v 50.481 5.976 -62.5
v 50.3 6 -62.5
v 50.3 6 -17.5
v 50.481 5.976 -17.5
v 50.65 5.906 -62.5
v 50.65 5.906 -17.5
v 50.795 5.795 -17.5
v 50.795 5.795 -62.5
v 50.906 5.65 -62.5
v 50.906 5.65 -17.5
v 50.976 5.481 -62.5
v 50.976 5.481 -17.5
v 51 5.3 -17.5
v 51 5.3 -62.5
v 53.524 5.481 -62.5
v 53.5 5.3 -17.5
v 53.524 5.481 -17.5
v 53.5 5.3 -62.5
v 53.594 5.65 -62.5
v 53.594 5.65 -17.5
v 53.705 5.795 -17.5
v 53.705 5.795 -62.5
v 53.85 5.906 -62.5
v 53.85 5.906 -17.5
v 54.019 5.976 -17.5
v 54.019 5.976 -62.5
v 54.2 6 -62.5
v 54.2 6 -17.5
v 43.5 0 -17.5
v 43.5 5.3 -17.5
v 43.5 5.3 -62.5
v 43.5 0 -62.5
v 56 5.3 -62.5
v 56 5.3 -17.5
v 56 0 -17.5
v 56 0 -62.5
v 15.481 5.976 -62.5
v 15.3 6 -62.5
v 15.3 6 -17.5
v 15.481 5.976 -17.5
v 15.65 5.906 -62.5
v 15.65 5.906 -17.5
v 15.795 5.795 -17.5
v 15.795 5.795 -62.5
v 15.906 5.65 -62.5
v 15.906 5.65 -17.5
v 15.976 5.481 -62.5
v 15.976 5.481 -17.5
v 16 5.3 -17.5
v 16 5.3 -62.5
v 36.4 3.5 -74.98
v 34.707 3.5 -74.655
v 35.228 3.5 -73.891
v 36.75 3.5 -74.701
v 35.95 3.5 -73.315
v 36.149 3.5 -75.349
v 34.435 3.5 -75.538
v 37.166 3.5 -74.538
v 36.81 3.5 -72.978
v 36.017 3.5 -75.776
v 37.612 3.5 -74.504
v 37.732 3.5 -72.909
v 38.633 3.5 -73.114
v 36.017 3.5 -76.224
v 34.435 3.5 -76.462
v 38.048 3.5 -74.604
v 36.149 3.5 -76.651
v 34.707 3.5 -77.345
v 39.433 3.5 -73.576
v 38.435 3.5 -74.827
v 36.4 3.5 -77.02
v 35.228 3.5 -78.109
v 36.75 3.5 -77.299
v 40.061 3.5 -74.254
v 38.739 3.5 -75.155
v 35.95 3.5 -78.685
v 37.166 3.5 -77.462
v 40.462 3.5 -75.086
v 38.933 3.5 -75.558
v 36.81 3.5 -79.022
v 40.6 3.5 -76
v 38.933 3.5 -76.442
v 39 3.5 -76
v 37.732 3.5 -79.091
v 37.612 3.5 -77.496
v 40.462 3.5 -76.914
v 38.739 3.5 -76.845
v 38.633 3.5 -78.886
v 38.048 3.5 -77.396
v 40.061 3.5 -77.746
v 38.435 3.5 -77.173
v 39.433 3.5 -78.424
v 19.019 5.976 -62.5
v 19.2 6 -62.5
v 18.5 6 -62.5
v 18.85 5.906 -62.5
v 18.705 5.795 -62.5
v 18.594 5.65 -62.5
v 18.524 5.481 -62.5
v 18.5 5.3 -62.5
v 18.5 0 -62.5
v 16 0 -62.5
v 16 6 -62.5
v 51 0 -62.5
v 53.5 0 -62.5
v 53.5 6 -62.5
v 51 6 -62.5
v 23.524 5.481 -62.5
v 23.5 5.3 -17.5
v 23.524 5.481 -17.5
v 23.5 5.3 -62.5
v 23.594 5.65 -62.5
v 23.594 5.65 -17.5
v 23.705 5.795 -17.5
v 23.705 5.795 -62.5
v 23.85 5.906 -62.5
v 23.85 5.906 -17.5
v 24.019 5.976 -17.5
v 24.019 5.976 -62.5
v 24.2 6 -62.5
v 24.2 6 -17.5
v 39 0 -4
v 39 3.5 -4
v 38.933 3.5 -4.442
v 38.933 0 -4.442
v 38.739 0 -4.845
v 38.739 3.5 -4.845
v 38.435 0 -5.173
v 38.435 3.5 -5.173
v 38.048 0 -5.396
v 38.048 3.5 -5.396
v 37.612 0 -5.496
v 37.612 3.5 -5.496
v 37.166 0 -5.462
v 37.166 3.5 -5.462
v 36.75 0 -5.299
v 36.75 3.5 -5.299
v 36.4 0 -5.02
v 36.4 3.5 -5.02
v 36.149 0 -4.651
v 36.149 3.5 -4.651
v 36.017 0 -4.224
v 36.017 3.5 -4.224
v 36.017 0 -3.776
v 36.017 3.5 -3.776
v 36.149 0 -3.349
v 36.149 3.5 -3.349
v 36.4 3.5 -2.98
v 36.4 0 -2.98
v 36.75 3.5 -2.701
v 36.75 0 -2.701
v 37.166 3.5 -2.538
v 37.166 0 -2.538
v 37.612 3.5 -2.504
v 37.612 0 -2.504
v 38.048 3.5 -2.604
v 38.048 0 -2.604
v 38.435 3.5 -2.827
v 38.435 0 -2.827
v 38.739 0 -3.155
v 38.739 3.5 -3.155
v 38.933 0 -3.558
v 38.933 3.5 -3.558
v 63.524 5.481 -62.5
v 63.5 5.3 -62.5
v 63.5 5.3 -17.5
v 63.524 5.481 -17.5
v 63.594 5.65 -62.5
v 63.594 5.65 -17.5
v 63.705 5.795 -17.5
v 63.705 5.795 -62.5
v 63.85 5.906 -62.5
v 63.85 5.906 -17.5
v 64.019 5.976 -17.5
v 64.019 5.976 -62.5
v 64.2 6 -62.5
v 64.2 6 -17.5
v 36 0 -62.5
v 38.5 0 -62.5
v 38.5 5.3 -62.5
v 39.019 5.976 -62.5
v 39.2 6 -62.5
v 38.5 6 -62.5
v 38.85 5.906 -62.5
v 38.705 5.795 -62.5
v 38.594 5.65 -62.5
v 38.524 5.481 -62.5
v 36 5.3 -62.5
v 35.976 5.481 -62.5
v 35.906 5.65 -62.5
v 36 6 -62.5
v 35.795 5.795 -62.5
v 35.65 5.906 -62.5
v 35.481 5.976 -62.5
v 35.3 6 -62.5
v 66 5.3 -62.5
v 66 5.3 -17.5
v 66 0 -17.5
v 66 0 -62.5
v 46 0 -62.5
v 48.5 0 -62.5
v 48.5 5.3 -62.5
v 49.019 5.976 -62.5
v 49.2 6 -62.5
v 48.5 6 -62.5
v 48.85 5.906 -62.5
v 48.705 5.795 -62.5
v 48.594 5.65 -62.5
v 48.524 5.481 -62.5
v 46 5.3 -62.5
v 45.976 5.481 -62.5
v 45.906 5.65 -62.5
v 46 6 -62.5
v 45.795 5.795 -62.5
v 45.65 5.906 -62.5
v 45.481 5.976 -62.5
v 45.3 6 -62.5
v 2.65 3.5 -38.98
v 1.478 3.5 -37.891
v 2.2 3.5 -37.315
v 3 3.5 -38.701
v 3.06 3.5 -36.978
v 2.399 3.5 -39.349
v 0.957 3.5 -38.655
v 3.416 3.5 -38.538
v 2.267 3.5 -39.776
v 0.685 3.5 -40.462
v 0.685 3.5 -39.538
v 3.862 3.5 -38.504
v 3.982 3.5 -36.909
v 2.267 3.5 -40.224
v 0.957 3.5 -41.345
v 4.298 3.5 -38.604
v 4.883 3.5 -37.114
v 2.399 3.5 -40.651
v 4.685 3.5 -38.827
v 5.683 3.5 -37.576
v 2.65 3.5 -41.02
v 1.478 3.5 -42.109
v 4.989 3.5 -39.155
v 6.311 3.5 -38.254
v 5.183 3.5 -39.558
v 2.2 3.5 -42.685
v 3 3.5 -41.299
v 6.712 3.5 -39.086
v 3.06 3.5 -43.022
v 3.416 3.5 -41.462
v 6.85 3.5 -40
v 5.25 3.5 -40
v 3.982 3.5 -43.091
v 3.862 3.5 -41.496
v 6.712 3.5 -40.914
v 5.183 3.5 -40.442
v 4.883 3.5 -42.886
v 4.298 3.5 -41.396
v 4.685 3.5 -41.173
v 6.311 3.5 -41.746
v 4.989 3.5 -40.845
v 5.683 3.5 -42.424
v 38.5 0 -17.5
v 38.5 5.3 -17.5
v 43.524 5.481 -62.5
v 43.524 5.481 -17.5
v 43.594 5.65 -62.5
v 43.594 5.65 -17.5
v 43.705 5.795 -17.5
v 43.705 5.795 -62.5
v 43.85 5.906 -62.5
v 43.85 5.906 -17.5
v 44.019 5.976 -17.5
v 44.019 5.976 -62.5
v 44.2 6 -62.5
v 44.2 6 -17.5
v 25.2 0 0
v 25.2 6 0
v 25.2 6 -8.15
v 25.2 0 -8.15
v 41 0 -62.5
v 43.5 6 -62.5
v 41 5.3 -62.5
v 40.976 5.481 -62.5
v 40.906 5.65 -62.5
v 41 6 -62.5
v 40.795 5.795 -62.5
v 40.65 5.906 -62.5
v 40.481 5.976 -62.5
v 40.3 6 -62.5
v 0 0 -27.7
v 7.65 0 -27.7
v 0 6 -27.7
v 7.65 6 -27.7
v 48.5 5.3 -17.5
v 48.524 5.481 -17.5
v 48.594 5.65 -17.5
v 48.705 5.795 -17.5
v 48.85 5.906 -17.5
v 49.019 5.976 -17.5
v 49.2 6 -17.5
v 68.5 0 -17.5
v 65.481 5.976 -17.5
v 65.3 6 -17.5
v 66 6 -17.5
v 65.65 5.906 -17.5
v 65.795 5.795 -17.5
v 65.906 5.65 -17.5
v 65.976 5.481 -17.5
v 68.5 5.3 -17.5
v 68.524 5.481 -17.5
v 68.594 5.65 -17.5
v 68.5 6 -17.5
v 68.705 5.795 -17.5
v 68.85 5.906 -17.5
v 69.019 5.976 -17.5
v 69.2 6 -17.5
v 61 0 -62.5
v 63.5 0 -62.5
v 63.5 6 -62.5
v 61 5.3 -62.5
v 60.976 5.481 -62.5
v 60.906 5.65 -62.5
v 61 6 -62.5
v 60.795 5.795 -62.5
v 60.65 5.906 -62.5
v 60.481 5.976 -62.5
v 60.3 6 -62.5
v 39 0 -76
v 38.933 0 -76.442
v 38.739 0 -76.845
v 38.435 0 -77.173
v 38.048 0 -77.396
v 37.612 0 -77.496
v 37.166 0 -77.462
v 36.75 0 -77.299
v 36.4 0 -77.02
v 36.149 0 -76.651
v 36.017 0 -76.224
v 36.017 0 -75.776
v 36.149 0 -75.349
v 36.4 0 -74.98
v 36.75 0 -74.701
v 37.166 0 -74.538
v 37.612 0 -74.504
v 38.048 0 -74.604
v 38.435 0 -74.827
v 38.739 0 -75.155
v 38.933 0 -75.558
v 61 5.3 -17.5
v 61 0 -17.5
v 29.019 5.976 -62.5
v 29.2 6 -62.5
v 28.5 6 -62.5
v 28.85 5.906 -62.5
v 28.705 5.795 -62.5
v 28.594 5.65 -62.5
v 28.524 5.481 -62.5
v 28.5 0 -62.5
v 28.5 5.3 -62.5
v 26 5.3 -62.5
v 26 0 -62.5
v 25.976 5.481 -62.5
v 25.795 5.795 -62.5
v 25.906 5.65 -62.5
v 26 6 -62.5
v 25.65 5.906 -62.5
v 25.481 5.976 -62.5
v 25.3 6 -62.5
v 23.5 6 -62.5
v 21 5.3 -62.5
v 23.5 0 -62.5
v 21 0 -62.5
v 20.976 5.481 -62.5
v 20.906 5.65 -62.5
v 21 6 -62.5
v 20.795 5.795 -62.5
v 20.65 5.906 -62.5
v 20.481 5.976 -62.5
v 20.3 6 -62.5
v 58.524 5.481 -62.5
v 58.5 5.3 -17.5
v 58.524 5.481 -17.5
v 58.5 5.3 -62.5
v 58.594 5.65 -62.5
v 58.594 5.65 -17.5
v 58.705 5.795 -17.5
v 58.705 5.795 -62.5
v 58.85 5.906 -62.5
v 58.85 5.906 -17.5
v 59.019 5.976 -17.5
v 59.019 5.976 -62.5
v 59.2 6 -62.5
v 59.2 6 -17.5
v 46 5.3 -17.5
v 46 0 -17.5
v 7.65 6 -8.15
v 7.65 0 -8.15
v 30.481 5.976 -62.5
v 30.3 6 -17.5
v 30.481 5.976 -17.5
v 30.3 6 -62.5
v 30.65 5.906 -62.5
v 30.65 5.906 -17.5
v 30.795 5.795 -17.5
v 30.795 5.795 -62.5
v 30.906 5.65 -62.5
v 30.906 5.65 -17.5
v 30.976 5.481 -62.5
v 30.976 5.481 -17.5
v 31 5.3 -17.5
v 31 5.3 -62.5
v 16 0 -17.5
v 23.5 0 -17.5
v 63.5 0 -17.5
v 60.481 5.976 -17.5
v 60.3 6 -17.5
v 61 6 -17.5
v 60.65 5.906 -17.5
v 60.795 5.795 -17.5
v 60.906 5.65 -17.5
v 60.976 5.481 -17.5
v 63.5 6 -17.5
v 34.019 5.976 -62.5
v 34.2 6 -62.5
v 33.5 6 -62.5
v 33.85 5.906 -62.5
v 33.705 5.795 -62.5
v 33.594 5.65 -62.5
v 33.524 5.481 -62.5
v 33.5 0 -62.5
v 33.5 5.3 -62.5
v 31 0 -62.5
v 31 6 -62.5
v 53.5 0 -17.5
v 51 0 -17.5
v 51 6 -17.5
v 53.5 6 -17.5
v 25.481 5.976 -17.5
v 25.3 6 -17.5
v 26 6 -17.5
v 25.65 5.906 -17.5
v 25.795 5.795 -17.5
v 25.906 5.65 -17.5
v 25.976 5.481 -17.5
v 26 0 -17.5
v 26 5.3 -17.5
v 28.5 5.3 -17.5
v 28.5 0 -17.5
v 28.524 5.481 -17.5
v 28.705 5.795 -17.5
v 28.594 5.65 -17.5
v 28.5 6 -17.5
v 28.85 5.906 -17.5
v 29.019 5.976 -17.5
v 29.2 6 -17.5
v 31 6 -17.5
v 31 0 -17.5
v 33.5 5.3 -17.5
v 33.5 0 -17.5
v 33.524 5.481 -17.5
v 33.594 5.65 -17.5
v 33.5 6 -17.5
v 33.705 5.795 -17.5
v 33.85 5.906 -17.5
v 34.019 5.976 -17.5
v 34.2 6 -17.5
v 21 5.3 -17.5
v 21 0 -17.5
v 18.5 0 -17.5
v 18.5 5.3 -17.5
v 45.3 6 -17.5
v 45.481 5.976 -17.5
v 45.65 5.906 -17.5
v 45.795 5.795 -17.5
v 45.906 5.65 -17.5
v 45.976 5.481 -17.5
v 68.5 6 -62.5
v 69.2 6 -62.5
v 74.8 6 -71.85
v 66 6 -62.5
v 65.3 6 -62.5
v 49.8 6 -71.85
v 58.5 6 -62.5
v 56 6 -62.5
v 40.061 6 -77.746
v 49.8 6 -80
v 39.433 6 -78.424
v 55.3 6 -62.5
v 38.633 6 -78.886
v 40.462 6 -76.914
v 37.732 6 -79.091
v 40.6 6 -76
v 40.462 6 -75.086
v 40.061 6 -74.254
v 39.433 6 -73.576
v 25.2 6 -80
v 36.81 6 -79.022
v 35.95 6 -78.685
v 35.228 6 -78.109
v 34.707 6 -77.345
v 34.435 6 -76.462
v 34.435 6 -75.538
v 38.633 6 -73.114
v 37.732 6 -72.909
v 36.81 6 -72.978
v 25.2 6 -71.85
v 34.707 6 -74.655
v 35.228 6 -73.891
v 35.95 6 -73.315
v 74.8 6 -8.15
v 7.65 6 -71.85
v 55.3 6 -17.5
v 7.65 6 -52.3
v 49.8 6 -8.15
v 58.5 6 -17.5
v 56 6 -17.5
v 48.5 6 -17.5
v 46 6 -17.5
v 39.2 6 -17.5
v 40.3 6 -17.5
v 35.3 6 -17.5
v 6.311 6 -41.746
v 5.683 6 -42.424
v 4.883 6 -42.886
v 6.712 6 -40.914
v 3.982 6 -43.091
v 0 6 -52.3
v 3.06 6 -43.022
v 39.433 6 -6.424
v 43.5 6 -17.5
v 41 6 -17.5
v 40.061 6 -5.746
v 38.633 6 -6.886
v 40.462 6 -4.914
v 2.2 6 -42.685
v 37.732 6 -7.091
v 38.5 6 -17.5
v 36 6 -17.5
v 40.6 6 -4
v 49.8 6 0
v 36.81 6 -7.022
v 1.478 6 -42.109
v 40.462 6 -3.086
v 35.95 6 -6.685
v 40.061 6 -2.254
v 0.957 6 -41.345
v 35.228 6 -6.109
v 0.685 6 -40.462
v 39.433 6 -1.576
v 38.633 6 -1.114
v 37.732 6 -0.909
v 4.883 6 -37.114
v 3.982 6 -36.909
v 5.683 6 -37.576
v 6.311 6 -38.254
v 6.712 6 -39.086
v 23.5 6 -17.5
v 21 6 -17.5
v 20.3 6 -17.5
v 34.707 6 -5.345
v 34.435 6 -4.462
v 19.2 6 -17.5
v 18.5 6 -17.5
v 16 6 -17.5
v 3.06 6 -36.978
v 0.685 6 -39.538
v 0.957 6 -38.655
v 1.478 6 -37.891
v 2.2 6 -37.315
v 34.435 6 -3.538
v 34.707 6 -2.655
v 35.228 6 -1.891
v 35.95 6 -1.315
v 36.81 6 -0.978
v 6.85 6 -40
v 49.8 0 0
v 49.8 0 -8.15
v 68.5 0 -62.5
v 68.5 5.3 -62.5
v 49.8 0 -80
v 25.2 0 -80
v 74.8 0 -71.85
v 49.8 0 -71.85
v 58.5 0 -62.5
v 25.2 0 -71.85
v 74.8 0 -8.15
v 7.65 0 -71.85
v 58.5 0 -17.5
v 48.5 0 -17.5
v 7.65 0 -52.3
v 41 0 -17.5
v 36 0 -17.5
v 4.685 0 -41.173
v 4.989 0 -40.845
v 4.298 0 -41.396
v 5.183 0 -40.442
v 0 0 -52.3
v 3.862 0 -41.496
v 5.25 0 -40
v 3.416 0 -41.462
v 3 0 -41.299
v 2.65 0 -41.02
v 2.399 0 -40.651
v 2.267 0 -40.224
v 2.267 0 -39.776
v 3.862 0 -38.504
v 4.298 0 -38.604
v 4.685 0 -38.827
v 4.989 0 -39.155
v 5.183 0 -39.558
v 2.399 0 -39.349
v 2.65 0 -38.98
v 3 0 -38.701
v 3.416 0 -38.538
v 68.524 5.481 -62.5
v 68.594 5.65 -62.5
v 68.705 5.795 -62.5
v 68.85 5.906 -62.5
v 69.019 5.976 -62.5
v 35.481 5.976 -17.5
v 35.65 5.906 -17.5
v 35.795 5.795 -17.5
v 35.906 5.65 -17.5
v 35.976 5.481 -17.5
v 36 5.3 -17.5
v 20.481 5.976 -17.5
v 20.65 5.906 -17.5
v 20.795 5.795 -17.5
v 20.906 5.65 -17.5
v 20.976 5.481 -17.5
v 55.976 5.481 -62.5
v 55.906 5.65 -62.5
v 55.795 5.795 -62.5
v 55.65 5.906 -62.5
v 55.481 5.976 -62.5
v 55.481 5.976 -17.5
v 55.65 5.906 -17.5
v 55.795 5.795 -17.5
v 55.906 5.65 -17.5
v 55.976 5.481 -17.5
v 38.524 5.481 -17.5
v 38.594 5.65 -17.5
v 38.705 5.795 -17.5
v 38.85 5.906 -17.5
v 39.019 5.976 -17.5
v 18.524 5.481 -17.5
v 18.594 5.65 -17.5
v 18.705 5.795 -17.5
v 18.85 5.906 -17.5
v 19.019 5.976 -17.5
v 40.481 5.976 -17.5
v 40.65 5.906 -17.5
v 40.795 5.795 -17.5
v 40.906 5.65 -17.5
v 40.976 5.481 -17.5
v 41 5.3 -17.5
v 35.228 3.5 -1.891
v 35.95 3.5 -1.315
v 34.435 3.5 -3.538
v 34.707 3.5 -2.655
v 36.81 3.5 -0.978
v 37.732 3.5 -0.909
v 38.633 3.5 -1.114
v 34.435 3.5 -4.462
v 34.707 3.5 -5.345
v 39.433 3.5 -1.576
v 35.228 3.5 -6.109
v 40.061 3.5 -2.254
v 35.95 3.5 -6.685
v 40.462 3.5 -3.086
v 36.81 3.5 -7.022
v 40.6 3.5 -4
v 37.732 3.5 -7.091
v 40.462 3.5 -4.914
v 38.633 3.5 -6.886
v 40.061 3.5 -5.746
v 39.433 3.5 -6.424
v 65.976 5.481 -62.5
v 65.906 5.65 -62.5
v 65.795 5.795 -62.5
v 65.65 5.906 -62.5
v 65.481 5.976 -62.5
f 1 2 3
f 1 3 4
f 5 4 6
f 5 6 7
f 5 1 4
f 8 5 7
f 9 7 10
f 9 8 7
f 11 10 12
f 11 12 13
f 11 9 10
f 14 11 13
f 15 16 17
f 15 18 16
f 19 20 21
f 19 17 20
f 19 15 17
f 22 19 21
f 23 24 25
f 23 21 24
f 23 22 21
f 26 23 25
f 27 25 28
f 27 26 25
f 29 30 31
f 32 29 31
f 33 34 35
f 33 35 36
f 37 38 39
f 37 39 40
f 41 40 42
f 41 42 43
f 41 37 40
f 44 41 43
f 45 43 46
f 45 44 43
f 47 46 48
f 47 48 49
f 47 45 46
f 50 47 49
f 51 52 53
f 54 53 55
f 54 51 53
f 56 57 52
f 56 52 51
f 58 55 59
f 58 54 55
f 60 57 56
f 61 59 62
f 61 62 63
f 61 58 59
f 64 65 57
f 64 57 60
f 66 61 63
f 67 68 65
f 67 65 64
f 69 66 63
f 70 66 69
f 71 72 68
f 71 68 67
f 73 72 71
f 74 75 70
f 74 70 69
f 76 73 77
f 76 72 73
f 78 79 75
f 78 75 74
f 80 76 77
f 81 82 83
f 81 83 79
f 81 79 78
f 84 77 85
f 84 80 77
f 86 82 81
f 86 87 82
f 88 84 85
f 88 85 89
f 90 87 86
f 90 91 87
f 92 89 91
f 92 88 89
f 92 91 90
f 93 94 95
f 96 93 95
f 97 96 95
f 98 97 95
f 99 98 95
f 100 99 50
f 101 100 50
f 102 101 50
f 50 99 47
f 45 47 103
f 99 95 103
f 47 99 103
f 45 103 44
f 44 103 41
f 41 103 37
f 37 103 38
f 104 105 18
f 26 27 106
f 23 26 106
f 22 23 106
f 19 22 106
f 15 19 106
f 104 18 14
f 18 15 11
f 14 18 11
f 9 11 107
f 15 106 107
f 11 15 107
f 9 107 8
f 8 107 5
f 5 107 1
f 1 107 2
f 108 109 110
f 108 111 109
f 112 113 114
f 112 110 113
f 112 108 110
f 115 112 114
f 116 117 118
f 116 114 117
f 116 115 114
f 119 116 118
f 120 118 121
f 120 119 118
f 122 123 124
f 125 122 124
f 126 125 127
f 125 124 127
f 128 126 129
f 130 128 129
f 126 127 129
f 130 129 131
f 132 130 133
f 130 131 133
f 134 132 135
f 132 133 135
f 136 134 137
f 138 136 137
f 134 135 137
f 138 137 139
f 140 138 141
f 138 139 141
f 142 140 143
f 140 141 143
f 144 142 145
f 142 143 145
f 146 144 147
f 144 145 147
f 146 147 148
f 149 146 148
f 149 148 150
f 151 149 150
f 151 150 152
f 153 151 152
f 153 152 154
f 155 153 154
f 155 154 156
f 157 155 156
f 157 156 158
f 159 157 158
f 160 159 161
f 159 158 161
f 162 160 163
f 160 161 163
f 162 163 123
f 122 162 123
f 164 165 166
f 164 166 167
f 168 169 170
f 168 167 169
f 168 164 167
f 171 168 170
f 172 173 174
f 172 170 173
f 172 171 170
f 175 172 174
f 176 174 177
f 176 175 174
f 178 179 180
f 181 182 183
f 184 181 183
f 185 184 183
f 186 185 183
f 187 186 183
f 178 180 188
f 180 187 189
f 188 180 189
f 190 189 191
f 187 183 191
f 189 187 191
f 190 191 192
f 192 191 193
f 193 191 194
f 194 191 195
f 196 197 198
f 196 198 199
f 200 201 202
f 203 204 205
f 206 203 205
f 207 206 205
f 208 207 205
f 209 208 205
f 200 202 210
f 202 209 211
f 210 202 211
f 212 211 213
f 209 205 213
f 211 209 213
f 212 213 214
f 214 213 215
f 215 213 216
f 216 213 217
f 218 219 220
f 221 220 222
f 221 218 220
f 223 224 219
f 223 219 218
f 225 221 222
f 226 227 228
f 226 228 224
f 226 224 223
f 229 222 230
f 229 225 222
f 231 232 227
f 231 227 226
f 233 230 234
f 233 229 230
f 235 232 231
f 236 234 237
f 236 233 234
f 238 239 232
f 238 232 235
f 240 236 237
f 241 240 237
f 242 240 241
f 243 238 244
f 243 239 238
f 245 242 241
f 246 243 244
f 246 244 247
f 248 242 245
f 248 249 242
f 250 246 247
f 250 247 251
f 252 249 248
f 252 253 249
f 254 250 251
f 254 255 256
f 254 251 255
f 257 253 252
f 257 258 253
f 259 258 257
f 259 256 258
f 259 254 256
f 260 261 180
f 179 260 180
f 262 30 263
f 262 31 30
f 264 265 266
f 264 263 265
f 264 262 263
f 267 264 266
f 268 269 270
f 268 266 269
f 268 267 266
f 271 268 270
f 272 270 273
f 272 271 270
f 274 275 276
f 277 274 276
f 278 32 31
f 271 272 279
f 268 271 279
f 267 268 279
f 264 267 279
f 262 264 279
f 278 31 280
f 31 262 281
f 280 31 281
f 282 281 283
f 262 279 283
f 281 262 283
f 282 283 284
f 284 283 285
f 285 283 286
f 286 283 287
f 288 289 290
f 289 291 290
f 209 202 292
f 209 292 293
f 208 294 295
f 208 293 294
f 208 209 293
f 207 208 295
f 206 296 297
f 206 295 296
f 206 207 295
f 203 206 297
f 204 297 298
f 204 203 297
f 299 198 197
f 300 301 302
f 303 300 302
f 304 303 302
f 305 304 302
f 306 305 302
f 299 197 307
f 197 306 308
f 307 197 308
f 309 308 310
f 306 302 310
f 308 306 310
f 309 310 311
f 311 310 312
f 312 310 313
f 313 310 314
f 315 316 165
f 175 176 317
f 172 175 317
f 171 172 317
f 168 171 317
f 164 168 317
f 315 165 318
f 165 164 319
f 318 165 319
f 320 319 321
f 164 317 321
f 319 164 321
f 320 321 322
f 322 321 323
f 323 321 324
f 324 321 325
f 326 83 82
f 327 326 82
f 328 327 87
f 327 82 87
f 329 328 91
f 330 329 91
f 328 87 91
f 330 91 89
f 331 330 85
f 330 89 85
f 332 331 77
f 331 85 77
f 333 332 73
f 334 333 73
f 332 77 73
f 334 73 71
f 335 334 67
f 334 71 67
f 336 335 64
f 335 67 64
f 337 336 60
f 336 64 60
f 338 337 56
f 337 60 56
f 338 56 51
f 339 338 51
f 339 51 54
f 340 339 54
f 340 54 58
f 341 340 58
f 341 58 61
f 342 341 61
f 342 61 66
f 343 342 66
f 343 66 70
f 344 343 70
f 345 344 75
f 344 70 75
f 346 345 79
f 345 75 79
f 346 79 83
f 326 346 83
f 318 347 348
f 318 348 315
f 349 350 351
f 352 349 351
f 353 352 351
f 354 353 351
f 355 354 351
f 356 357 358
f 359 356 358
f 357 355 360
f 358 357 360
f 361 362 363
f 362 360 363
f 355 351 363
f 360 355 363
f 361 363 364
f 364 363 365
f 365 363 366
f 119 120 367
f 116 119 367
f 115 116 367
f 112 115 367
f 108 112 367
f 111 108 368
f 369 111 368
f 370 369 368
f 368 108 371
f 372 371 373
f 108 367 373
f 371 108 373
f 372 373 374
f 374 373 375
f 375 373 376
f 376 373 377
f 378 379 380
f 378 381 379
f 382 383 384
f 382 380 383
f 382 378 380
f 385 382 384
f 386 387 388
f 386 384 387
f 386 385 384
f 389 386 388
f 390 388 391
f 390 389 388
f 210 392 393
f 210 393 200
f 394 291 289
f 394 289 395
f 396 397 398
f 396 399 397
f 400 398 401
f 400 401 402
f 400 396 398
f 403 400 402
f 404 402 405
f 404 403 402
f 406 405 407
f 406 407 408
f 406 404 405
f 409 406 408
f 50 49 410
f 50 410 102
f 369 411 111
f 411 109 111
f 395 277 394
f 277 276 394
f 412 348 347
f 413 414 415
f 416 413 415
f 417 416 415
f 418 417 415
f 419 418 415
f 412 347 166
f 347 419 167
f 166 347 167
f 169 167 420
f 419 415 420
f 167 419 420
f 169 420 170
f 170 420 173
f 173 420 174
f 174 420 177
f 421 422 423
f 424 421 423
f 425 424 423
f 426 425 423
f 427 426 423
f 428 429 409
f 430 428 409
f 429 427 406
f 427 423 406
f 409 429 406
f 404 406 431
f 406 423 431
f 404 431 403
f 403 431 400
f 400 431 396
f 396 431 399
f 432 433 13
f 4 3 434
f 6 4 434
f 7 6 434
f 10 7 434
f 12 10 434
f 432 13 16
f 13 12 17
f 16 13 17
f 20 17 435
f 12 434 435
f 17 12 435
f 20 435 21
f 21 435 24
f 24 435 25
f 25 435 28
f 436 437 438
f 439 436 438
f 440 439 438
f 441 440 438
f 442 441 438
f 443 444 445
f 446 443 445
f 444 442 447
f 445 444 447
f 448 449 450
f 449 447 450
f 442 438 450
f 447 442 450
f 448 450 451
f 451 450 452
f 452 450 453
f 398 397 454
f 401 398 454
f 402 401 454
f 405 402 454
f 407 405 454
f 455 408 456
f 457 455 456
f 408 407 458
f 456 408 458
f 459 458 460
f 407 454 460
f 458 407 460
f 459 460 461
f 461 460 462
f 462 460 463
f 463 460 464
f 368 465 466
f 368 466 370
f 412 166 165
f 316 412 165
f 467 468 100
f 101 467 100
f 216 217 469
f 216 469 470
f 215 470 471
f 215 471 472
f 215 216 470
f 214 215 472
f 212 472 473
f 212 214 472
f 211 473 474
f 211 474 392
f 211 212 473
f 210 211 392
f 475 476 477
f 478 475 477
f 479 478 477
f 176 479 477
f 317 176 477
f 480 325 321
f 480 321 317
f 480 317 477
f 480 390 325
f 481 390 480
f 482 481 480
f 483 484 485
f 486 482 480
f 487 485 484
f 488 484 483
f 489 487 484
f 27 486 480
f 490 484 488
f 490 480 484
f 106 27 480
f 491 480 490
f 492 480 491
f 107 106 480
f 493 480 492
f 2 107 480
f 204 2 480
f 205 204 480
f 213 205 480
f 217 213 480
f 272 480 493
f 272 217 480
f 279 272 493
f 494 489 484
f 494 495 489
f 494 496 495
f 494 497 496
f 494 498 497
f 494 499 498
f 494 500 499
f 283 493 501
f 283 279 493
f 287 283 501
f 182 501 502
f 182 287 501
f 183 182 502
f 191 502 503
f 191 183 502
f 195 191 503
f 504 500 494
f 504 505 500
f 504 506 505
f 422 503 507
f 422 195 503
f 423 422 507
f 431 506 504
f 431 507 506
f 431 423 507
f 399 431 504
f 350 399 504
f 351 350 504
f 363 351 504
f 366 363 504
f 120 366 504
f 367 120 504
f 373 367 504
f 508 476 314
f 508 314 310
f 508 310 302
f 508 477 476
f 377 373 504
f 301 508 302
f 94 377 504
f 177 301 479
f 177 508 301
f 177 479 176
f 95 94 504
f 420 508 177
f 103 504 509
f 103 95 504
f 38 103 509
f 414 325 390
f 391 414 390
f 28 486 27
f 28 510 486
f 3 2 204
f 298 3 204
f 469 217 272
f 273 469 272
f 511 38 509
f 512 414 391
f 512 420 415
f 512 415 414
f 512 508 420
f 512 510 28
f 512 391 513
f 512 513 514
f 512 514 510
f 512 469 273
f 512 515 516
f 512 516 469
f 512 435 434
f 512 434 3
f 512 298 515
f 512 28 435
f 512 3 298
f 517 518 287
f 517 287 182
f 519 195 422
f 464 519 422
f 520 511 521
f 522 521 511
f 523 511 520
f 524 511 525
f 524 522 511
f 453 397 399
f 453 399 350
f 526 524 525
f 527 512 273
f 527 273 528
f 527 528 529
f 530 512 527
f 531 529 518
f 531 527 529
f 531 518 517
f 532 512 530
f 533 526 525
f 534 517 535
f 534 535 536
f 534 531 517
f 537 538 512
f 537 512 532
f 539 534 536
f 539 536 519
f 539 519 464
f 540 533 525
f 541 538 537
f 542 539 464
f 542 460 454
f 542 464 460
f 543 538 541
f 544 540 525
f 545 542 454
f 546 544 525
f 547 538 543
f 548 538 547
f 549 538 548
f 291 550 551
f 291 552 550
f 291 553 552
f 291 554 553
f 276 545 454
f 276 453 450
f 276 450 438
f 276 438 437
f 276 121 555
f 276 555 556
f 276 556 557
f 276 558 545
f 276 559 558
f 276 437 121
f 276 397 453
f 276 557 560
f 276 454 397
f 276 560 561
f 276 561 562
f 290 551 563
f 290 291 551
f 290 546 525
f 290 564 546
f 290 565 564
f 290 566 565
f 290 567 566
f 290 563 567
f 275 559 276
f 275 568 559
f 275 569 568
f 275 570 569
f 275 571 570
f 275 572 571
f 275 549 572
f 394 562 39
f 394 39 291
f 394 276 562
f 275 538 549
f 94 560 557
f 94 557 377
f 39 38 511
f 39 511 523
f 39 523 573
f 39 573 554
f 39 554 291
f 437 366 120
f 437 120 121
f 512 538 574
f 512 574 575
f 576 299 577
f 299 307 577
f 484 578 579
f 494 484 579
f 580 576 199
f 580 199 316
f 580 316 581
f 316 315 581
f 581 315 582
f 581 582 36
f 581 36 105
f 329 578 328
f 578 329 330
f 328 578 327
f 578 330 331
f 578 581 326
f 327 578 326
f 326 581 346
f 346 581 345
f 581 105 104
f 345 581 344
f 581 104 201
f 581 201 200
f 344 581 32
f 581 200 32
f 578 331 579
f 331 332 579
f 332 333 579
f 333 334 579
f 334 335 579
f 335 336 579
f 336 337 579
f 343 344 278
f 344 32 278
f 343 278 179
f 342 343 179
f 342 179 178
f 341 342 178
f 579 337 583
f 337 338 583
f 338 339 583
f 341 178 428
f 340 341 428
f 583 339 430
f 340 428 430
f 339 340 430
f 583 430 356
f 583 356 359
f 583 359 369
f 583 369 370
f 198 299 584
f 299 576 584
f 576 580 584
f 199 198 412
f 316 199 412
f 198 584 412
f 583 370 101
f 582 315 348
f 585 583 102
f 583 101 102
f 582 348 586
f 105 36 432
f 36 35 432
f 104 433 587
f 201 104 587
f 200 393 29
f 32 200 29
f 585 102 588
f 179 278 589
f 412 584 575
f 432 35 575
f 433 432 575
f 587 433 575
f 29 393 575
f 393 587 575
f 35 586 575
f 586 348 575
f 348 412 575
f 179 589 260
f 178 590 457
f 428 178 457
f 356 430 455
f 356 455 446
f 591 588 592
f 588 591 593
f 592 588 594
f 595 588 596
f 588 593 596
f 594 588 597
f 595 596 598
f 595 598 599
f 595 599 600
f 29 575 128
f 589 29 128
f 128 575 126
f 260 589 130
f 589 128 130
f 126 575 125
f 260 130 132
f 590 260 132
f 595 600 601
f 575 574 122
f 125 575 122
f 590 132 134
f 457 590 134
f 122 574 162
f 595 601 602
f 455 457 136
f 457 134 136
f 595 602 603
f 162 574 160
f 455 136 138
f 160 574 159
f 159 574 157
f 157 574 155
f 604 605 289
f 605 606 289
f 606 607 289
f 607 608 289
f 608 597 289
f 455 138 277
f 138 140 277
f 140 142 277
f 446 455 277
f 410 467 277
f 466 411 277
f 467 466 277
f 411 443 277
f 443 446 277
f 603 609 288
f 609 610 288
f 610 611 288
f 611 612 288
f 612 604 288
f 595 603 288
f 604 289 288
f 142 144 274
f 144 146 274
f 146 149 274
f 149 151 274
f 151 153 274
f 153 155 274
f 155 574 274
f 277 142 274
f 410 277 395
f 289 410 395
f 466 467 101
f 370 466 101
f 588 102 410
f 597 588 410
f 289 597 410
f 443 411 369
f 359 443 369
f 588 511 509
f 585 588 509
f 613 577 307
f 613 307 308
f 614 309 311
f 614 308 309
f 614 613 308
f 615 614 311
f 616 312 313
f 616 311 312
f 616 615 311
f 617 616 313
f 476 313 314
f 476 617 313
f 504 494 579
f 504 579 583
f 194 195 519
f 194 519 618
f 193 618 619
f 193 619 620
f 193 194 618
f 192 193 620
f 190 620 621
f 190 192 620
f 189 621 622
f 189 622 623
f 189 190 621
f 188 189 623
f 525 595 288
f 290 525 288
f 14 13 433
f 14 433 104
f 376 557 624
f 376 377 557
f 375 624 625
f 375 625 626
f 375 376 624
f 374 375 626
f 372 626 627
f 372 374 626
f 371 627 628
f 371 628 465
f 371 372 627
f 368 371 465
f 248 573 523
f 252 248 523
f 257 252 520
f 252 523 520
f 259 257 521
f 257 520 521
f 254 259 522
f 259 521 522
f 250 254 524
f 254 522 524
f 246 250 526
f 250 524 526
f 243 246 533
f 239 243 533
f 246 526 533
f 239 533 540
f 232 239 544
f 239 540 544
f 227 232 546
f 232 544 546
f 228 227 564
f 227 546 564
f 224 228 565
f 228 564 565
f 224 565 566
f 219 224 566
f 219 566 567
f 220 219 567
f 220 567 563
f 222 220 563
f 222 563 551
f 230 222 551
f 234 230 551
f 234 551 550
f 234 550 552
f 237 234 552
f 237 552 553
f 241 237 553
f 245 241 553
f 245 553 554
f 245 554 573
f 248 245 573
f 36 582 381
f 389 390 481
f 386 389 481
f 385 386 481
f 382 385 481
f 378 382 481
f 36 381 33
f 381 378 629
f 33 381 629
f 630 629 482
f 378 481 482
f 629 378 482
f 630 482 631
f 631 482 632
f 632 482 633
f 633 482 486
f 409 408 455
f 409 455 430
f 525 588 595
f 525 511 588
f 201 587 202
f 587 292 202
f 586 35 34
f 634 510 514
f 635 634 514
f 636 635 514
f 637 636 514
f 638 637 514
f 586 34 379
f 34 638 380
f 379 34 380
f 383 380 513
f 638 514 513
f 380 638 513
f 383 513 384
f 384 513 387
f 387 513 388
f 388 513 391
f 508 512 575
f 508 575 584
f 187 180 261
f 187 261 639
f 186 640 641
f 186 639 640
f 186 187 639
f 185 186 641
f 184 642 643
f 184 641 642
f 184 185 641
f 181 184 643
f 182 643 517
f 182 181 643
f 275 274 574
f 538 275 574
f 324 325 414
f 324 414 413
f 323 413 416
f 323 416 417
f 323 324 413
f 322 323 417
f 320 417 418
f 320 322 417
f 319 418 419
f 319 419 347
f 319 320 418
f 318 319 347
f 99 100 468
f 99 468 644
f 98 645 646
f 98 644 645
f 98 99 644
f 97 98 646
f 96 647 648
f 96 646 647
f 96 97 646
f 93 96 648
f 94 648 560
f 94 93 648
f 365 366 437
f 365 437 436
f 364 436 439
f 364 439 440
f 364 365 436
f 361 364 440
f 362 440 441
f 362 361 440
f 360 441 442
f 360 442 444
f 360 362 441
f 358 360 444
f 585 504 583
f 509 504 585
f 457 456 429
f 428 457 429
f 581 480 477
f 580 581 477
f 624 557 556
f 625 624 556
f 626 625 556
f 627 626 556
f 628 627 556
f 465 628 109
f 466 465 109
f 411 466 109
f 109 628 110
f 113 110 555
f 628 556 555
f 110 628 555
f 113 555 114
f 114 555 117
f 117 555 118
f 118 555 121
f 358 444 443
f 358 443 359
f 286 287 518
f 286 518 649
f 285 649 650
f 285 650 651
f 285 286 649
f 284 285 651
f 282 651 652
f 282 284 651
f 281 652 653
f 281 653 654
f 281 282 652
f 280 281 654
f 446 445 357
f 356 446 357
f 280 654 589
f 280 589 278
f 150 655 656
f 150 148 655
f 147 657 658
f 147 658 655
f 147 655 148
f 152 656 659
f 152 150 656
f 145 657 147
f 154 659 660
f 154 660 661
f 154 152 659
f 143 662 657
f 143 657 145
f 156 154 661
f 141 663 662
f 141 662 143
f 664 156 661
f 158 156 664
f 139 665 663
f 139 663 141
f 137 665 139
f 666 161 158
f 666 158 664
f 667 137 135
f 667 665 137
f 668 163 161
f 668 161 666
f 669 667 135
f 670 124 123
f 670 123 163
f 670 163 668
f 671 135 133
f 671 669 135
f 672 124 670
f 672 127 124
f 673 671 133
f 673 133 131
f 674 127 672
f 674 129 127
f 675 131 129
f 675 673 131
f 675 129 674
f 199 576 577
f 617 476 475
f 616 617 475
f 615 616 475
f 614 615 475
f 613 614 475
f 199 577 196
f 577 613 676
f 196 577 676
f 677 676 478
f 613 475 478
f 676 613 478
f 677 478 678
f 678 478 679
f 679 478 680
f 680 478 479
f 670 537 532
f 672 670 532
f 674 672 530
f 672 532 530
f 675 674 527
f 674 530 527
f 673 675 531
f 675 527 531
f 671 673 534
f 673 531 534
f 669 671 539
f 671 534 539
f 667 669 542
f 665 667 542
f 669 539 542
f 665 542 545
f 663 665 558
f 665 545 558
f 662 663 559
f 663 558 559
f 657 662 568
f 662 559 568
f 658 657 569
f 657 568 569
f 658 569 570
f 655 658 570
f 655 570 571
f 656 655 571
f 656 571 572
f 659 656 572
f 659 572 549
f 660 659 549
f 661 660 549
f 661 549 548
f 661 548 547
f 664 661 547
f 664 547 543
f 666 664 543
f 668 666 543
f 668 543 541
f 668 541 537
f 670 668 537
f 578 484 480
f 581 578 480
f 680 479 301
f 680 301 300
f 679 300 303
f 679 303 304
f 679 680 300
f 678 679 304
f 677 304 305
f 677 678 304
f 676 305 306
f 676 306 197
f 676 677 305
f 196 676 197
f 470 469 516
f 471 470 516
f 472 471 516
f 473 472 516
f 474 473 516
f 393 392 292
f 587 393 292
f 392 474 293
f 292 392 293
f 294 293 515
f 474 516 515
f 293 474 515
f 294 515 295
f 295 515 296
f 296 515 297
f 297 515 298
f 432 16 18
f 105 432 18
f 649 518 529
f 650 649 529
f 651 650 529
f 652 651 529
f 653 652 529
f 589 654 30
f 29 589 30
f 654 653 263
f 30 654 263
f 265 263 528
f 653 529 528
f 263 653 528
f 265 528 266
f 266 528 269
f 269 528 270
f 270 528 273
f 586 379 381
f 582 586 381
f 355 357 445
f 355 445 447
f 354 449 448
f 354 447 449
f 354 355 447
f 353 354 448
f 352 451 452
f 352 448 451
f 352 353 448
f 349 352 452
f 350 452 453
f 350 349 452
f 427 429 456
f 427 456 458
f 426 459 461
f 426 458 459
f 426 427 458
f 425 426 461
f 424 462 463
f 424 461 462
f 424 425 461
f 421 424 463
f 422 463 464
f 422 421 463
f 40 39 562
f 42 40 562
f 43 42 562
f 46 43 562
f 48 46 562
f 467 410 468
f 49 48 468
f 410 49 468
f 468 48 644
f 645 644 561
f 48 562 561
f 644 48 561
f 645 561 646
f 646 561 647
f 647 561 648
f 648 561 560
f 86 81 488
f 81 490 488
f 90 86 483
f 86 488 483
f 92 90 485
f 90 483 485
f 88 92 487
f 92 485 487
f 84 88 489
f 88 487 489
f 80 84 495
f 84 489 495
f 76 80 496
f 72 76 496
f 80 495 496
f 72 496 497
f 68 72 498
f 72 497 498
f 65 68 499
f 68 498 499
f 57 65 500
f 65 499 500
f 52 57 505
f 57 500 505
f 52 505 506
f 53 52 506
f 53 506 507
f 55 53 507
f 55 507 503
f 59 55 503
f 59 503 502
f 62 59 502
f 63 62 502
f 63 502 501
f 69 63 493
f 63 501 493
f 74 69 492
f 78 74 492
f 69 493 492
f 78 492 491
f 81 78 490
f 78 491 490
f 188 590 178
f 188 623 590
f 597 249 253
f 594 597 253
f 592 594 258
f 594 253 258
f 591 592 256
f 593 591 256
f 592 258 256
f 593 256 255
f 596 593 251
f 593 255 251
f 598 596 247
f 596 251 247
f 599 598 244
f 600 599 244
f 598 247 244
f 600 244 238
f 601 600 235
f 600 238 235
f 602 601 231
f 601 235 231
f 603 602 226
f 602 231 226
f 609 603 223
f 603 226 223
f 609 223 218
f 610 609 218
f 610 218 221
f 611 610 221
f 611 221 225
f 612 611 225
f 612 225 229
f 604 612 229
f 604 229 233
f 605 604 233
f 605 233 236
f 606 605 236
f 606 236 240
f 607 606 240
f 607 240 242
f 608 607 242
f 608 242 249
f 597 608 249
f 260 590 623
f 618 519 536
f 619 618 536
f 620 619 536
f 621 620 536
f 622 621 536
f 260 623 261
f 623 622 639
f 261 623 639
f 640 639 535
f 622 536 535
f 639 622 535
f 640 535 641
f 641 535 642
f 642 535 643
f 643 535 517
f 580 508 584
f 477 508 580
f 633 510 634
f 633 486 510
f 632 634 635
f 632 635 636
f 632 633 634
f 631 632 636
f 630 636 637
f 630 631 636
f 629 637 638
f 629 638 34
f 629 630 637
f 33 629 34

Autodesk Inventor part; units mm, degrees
ref_plane "YZ Plane" through (0, 0, 0) normal (1, 0, 0) x (0, 1, 0)
ref_plane "XZ Plane" through (0, 0, 0) normal (0, 1, 0) x (-1, 0, 0)
ref_plane "XY Plane" through (0, 0, 0) normal (0, 0, 1) x (1, 0, 0)
sketch "Boceto1" plane through (0, 0, 0) normal (0, 1, 0) x (-1, 0, 0)
  line L0 (0, 0) -> (-75, 0)
  line L1 (-75, 0) -> (-75, -80)
  line L2 (-75, -80) -> (0, -80)
  line L3 (0, -80) -> (0, 0)
  dimension "d0" = 80
  dimension "d1" = 75
extrude "Extrusión1" add sketch "Boceto1" along normal blind 6
sketch "Boceto2" plane through (0, 6, 0) normal (0, 1, 0) x (1, 0, 0)
  line L0 (0, 0) -> (75, 0) projected
  line L1 (25, 0) -> (25, 8)
  line L2 (25, 8) -> (7.5, 8)
  line L3 (7.5, 8) -> (7.5, 27.5)
  line L4 (7.5, 27.5) -> (0, 27.5)
  line L5 (0, 27.5) -> (0, 40)
  line L6 (25, 0) -> (50, 0)
  line L7 (50, 0) -> (50, 8)
  line L8 (50, 8) -> (75, 8)
  line L9 (75, 0) -> (75, 80) projected
  line L10 (-21.9373, 40) -> (100.0778, 40)
  line L11 (25, 0) -> (50, 0)
  line L12 (25, 80) -> (25, 72)
  line L13 (25, 72) -> (7.5, 72)
  line L14 (7.5, 72) -> (7.5, 52.5)
  line L15 (7.5, 52.5) -> (0, 52.5)
  line L16 (0, 52.5) -> (0, 40)
  line L17 (50, 80) -> (50, 72)
  line L18 (50, 72) -> (75, 72)
  line L19 (25, 80) -> (50, 80)
  line L20 (75, 80) -> (0, 80) projected
  line L21 (0, 80) -> (0, 0) projected
  dimension "d4" = 12.5
  dimension "d7" = 8
  dimension "d8" = 25
  dimension "d9" = 25
  dimension "d10" = 12.5
  dimension "d11" = 27.5
  dimension "d12" = 27.5
  dimension "d13" = 8
  dimension "d14" = 8
  dimension "d15" = 8
  dimension "d16" = 7.5
  dimension "d17" = 25
  dimension "d18" = 25
  dimension "d19" = 25
  dimension "d20" = 25
extrude "Extrusión2" cut sketch "Boceto2" against normal through all contours L21 L4 L3 L2 L1 L0 | L7 L8 L9 L0 | L21 L20 L12 L13 L14 L15 | L18 L17 L20 L9
sketch "Boceto3" plane through (0, 6, 0) normal (0, 1, 0) x (1, 0, 0)
  circle A0 centre (3.75, 40) radius 1.5
  circle A1 centre (37.5, 76) radius 1.5
  circle A2 centre (37.5, 4) radius 1.5
  line L0 (7.5, 52.5) -> (0, 52.5) projected
  line L1 (0, 52.5) -> (0, 27.5) projected
  line L2 (50, 80) -> (25, 80) projected
  line L3 (25, 0) -> (50, 0) projected
  line L4 (50, 0) -> (50, 8) projected
  line L5 (50, 72) -> (50, 80) projected
  point P0 (0, 0)
  dimension "d23" = 3
  dimension "d24" = 12.5
  dimension "d25" = 3.75
  dimension "d26" = 4
  dimension "d27" = 4
  dimension "d28" = 12.5
  dimension "d29" = 12.5
extrude "Extrusión3" cut sketch "Boceto3" against normal through all
sketch "Boceto4" plane through (0, 6, 0) normal (0, 1, 0) x (1, 0, 0)
  circle A0 centre (3.75, 40) radius 1.5 projected
  circle A1 centre (3.75, 40) radius 3.1
  circle A2 centre (37.5, 4) radius 1.5 projected
  circle A3 centre (37.5, 4) radius 3.1
  circle A4 centre (37.5, 76) radius 1.5 projected
  circle A5 centre (37.5, 76) radius 3.1
  point P0 (0, 0)
  dimension "d32" = 6.2
extrude "Extrusión4" cut sketch "Boceto4" against normal blind 2.5 contours A0 | A1 | A2 | A3 | A5
sketch "Boceto5" plane through (0, 6, 0) normal (0, 1, 0) x (1, 0, 0)
  line L0 (0, 52.5) -> (0, 27.5) projected
  line L1 (7.5, 52.5) -> (0, 52.5) projected
  line L2 (0, 52.5) -> (7.5, 52.5)
  line L3 (7.5, 52.5) -> (7.5, 52.3)
  line L4 (7.5, 52.3) -> (0, 52.3)
  line L5 (0, 52.3) -> (0, 52.5)
  line L6 (25, 80) -> (25, 72) projected
  line L7 (25, 80) -> (25.2, 80)
  line L8 (25.2, 80) -> (25.2, 71.85)
  line L9 (25.2, 71.85) -> (25, 71.85)
  line L10 (25, 71.85) -> (25, 80)
  line L11 (7.5, 72) -> (25, 72)
  line L12 (25, 72) -> (25, 71.85)
  line L13 (25, 71.85) -> (7.5, 71.85)
  line L14 (7.5, 71.85) -> (7.5, 72)
  line L15 (7.5, 52.3) -> (7.65, 52.3)
  line L16 (7.65, 52.3) -> (7.65, 72)
  line L17 (7.65, 72) -> (7.5, 72)
  line L18 (7.5, 72) -> (7.5, 52.3)
  line L19 (50, 80) -> (25, 80) projected
  line L20 (50, 80) -> (49.8, 80)
  line L21 (49.8, 80) -> (49.8, 71.85)
  line L22 (49.8, 71.85) -> (50, 71.85)
  line L23 (50, 71.85) -> (50, 80)
  line L24 (50, 71.85) -> (75, 71.85)
  line L25 (75, 71.85) -> (75, 72)
  line L26 (75, 72) -> (50, 72)
  line L27 (50, 72) -> (50, 71.85)
  line L28 (50, 8) -> (75, 8) projected
  line L29 (75, 8) -> (74.8, 8)
  line L30 (74.8, 8) -> (74.8, 72)
  line L31 (74.8, 72) -> (75, 72)
  line L32 (75, 72) -> (75, 8)
  line L33 (-2.8758, 40) -> (82.3038, 40)
  line L34 (7.5, 27.5) -> (0, 27.5)
  line L35 (0, 27.5) -> (7.5, 27.5)
  line L36 (7.5, 27.5) -> (7.5, 27.7)
  line L37 (7.5, 27.7) -> (0, 27.7)
  line L38 (0, 27.7) -> (0, 27.5)
  line L39 (25, 0) -> (25, 8)
  line L40 (25, 0) -> (25.2, 0)
  line L41 (25.2, 0) -> (25.2, 8.15)
  line L42 (25.2, 8.15) -> (25, 8.15)
  line L43 (25, 8.15) -> (25, 0)
  line L44 (7.5, 8) -> (25, 8)
  line L45 (25, 8) -> (25, 8.15)
  line L46 (25, 8.15) -> (7.5, 8.15)
  line L47 (7.5, 8.15) -> (7.5, 8)
  line L48 (7.5, 27.7) -> (7.65, 27.7)
  line L49 (7.65, 27.7) -> (7.65, 8)
  line L50 (7.65, 8) -> (7.5, 8)
  line L51 (7.5, 8) -> (7.5, 27.7)
  line L52 (50, 0) -> (49.8, 0)
  line L53 (49.8, 0) -> (49.8, 8.15)
  line L54 (49.8, 8.15) -> (50, 8.15)
  line L55 (50, 8.15) -> (50, 0)
  line L56 (50, 8.15) -> (75, 8.15)
  line L57 (75, 8.15) -> (75, 8)
  line L58 (75, 8) -> (50, 8)
  line L59 (50, 8) -> (50, 8.15)
  point P0 (0, 0)
  point P1 (7.5, 8.15)
  point P2 (7.65, 8.15)
  point P3 (0, 27.7)
  point P4 (74.8, 71.85)
  point P5 (74.8, 8.15)
  point P6 (0, 52.3)
  point P7 (7.65, 71.85)
  point P8 (7.5, 71.85)
  dimension "d35" = 0.2
  dimension "d36" = 0.15
  dimension "d37" = 0.2
  dimension "d38" = 0.15
  dimension "d39" = 0.2
  dimension "d40" = 0.15
  dimension "d41" = 0.2
extrude "Extrusión5" cut sketch "Boceto5" against normal blind 6 contours L1 L3 L4 L0 | L37 L36 L34 L0 | L18 L13 L16 L15 L3 | L14 L11 L16 L13 | L33 L32 L56 L30 | L30 L24 L32 L33 | L16 L11 L10 L13 | L48 L49 L46 L51 L36 | L56 L32 L28 L30 | L30 L28 L55 L56 | L30 L26 L25 L24 | L24 L23 L26 L30 | L10 L6 L7 L8 L9 | L55 L52 L53 L54 | L22 L21 L19 L23 | L46 L49 L44 L47 | L46 L43 L44 L49 | L42 L41 L40 L39 L43
sketch "Boceto6" plane through (0, 6, 0) normal (0, 1, 0) x (1, 0, 0)
  point P0 (0, 0)
sketch "Boceto7" plane through (0, 6, 0) normal (0, 1, 0) x (1, 0, 0)
  line L0 (13.5, 17.5) -> (68.5, 17.5)
  line L1 (68.5, 17.5) -> (68.5, 62.5)
  line L2 (68.5, 62.5) -> (13.5, 62.5)
  line L3 (13.5, 62.5) -> (13.5, 17.5)
  line L4 (0, 52.3) -> (0, 27.7) projected
  line L5 (49.8, 80) -> (25.2, 80) projected
  line L6 (13.5, 17.5) -> (16, 17.5)
  line L7 (16, 17.5) -> (16, 62.5)
  line L8 (16, 62.5) -> (13.5, 62.5)
  line L9 (13.5, 62.5) -> (13.5, 17.5)
  line L10 (18.5, 17.5) -> (18.5, 62.5)
  line L11 (21, 17.5) -> (21, 62.5)
  line L12 (23.5, 17.5) -> (23.5, 62.5)
  line L13 (26, 17.5) -> (26, 62.5)
  line L14 (28.5, 17.5) -> (28.5, 62.5)
  line L15 (31, 17.5) -> (31, 62.5)
  line L16 (33.5, 17.5) -> (33.5, 62.5)
  line L17 (36, 17.5) -> (36, 62.5)
  line L18 (38.5, 17.5) -> (38.5, 62.5)
  line L19 (41, 17.5) -> (41, 62.5)
  line L20 (43.5, 17.5) -> (43.5, 62.5)
  line L21 (46, 17.5) -> (46, 62.5)
  line L22 (48.5, 17.5) -> (48.5, 62.5)
  line L23 (51, 17.5) -> (51, 62.5)
  line L24 (53.5, 17.5) -> (53.5, 62.5)
  line L25 (56, 17.5) -> (56, 62.5)
  line L26 (58.5, 17.5) -> (58.5, 62.5)
  line L27 (61, 17.5) -> (61, 62.5)
  line L28 (63.5, 17.5) -> (63.5, 62.5)
  line L29 (66, 17.5) -> (66, 62.5)
  point P0 (0, 0)
  point P1 (0, 40)
  point P2 (37.5, 80)
  dimension "d44" = 45
  dimension "d45" = 55
  dimension "d46" = 22.5
  dimension "d47" = 31
  dimension "d48" = 2.5
  dimension "d51" = 2.5
extrude "Extrusión6" cut sketch "Boceto7" against normal blind 6 contours L7 L2 L10 L0 | L11 L2 L12 L0 | L13 L2 L14 L0 | L15 L2 L16 L0 | L17 L2 L18 L0 | L19 L2 L20 L0 | L21 L2 L22 L0 | L23 L2 L24 L0 | L25 L2 L26 L0 | L27 L2 L28 L0 | L29 L2 L1 L0
fillet "Empalme1" radius 0.7 22 edges at (66, 6, -40) (63.5, 6, -40) (61, 6, -40) (58.5, 6, -40) (56, 6, -40) (53.5, 6, -40) (51, 6, -40) (48.5, 6, -40) (46, 6, -40) (43.5, 6, -40) (41, 6, -40) (38.5, 6, -40) (68.5, 6, -40) (36, 6, -40) (33.5, 6, -40) (31, 6, -40) (28.5, 6, -40) (26, 6, -40) (23.5, 6, -40) (21, 6, -40) (18.5, 6, -40) (16, 6, -40)
properties part number "Tapa - Caja para Electrónica"
